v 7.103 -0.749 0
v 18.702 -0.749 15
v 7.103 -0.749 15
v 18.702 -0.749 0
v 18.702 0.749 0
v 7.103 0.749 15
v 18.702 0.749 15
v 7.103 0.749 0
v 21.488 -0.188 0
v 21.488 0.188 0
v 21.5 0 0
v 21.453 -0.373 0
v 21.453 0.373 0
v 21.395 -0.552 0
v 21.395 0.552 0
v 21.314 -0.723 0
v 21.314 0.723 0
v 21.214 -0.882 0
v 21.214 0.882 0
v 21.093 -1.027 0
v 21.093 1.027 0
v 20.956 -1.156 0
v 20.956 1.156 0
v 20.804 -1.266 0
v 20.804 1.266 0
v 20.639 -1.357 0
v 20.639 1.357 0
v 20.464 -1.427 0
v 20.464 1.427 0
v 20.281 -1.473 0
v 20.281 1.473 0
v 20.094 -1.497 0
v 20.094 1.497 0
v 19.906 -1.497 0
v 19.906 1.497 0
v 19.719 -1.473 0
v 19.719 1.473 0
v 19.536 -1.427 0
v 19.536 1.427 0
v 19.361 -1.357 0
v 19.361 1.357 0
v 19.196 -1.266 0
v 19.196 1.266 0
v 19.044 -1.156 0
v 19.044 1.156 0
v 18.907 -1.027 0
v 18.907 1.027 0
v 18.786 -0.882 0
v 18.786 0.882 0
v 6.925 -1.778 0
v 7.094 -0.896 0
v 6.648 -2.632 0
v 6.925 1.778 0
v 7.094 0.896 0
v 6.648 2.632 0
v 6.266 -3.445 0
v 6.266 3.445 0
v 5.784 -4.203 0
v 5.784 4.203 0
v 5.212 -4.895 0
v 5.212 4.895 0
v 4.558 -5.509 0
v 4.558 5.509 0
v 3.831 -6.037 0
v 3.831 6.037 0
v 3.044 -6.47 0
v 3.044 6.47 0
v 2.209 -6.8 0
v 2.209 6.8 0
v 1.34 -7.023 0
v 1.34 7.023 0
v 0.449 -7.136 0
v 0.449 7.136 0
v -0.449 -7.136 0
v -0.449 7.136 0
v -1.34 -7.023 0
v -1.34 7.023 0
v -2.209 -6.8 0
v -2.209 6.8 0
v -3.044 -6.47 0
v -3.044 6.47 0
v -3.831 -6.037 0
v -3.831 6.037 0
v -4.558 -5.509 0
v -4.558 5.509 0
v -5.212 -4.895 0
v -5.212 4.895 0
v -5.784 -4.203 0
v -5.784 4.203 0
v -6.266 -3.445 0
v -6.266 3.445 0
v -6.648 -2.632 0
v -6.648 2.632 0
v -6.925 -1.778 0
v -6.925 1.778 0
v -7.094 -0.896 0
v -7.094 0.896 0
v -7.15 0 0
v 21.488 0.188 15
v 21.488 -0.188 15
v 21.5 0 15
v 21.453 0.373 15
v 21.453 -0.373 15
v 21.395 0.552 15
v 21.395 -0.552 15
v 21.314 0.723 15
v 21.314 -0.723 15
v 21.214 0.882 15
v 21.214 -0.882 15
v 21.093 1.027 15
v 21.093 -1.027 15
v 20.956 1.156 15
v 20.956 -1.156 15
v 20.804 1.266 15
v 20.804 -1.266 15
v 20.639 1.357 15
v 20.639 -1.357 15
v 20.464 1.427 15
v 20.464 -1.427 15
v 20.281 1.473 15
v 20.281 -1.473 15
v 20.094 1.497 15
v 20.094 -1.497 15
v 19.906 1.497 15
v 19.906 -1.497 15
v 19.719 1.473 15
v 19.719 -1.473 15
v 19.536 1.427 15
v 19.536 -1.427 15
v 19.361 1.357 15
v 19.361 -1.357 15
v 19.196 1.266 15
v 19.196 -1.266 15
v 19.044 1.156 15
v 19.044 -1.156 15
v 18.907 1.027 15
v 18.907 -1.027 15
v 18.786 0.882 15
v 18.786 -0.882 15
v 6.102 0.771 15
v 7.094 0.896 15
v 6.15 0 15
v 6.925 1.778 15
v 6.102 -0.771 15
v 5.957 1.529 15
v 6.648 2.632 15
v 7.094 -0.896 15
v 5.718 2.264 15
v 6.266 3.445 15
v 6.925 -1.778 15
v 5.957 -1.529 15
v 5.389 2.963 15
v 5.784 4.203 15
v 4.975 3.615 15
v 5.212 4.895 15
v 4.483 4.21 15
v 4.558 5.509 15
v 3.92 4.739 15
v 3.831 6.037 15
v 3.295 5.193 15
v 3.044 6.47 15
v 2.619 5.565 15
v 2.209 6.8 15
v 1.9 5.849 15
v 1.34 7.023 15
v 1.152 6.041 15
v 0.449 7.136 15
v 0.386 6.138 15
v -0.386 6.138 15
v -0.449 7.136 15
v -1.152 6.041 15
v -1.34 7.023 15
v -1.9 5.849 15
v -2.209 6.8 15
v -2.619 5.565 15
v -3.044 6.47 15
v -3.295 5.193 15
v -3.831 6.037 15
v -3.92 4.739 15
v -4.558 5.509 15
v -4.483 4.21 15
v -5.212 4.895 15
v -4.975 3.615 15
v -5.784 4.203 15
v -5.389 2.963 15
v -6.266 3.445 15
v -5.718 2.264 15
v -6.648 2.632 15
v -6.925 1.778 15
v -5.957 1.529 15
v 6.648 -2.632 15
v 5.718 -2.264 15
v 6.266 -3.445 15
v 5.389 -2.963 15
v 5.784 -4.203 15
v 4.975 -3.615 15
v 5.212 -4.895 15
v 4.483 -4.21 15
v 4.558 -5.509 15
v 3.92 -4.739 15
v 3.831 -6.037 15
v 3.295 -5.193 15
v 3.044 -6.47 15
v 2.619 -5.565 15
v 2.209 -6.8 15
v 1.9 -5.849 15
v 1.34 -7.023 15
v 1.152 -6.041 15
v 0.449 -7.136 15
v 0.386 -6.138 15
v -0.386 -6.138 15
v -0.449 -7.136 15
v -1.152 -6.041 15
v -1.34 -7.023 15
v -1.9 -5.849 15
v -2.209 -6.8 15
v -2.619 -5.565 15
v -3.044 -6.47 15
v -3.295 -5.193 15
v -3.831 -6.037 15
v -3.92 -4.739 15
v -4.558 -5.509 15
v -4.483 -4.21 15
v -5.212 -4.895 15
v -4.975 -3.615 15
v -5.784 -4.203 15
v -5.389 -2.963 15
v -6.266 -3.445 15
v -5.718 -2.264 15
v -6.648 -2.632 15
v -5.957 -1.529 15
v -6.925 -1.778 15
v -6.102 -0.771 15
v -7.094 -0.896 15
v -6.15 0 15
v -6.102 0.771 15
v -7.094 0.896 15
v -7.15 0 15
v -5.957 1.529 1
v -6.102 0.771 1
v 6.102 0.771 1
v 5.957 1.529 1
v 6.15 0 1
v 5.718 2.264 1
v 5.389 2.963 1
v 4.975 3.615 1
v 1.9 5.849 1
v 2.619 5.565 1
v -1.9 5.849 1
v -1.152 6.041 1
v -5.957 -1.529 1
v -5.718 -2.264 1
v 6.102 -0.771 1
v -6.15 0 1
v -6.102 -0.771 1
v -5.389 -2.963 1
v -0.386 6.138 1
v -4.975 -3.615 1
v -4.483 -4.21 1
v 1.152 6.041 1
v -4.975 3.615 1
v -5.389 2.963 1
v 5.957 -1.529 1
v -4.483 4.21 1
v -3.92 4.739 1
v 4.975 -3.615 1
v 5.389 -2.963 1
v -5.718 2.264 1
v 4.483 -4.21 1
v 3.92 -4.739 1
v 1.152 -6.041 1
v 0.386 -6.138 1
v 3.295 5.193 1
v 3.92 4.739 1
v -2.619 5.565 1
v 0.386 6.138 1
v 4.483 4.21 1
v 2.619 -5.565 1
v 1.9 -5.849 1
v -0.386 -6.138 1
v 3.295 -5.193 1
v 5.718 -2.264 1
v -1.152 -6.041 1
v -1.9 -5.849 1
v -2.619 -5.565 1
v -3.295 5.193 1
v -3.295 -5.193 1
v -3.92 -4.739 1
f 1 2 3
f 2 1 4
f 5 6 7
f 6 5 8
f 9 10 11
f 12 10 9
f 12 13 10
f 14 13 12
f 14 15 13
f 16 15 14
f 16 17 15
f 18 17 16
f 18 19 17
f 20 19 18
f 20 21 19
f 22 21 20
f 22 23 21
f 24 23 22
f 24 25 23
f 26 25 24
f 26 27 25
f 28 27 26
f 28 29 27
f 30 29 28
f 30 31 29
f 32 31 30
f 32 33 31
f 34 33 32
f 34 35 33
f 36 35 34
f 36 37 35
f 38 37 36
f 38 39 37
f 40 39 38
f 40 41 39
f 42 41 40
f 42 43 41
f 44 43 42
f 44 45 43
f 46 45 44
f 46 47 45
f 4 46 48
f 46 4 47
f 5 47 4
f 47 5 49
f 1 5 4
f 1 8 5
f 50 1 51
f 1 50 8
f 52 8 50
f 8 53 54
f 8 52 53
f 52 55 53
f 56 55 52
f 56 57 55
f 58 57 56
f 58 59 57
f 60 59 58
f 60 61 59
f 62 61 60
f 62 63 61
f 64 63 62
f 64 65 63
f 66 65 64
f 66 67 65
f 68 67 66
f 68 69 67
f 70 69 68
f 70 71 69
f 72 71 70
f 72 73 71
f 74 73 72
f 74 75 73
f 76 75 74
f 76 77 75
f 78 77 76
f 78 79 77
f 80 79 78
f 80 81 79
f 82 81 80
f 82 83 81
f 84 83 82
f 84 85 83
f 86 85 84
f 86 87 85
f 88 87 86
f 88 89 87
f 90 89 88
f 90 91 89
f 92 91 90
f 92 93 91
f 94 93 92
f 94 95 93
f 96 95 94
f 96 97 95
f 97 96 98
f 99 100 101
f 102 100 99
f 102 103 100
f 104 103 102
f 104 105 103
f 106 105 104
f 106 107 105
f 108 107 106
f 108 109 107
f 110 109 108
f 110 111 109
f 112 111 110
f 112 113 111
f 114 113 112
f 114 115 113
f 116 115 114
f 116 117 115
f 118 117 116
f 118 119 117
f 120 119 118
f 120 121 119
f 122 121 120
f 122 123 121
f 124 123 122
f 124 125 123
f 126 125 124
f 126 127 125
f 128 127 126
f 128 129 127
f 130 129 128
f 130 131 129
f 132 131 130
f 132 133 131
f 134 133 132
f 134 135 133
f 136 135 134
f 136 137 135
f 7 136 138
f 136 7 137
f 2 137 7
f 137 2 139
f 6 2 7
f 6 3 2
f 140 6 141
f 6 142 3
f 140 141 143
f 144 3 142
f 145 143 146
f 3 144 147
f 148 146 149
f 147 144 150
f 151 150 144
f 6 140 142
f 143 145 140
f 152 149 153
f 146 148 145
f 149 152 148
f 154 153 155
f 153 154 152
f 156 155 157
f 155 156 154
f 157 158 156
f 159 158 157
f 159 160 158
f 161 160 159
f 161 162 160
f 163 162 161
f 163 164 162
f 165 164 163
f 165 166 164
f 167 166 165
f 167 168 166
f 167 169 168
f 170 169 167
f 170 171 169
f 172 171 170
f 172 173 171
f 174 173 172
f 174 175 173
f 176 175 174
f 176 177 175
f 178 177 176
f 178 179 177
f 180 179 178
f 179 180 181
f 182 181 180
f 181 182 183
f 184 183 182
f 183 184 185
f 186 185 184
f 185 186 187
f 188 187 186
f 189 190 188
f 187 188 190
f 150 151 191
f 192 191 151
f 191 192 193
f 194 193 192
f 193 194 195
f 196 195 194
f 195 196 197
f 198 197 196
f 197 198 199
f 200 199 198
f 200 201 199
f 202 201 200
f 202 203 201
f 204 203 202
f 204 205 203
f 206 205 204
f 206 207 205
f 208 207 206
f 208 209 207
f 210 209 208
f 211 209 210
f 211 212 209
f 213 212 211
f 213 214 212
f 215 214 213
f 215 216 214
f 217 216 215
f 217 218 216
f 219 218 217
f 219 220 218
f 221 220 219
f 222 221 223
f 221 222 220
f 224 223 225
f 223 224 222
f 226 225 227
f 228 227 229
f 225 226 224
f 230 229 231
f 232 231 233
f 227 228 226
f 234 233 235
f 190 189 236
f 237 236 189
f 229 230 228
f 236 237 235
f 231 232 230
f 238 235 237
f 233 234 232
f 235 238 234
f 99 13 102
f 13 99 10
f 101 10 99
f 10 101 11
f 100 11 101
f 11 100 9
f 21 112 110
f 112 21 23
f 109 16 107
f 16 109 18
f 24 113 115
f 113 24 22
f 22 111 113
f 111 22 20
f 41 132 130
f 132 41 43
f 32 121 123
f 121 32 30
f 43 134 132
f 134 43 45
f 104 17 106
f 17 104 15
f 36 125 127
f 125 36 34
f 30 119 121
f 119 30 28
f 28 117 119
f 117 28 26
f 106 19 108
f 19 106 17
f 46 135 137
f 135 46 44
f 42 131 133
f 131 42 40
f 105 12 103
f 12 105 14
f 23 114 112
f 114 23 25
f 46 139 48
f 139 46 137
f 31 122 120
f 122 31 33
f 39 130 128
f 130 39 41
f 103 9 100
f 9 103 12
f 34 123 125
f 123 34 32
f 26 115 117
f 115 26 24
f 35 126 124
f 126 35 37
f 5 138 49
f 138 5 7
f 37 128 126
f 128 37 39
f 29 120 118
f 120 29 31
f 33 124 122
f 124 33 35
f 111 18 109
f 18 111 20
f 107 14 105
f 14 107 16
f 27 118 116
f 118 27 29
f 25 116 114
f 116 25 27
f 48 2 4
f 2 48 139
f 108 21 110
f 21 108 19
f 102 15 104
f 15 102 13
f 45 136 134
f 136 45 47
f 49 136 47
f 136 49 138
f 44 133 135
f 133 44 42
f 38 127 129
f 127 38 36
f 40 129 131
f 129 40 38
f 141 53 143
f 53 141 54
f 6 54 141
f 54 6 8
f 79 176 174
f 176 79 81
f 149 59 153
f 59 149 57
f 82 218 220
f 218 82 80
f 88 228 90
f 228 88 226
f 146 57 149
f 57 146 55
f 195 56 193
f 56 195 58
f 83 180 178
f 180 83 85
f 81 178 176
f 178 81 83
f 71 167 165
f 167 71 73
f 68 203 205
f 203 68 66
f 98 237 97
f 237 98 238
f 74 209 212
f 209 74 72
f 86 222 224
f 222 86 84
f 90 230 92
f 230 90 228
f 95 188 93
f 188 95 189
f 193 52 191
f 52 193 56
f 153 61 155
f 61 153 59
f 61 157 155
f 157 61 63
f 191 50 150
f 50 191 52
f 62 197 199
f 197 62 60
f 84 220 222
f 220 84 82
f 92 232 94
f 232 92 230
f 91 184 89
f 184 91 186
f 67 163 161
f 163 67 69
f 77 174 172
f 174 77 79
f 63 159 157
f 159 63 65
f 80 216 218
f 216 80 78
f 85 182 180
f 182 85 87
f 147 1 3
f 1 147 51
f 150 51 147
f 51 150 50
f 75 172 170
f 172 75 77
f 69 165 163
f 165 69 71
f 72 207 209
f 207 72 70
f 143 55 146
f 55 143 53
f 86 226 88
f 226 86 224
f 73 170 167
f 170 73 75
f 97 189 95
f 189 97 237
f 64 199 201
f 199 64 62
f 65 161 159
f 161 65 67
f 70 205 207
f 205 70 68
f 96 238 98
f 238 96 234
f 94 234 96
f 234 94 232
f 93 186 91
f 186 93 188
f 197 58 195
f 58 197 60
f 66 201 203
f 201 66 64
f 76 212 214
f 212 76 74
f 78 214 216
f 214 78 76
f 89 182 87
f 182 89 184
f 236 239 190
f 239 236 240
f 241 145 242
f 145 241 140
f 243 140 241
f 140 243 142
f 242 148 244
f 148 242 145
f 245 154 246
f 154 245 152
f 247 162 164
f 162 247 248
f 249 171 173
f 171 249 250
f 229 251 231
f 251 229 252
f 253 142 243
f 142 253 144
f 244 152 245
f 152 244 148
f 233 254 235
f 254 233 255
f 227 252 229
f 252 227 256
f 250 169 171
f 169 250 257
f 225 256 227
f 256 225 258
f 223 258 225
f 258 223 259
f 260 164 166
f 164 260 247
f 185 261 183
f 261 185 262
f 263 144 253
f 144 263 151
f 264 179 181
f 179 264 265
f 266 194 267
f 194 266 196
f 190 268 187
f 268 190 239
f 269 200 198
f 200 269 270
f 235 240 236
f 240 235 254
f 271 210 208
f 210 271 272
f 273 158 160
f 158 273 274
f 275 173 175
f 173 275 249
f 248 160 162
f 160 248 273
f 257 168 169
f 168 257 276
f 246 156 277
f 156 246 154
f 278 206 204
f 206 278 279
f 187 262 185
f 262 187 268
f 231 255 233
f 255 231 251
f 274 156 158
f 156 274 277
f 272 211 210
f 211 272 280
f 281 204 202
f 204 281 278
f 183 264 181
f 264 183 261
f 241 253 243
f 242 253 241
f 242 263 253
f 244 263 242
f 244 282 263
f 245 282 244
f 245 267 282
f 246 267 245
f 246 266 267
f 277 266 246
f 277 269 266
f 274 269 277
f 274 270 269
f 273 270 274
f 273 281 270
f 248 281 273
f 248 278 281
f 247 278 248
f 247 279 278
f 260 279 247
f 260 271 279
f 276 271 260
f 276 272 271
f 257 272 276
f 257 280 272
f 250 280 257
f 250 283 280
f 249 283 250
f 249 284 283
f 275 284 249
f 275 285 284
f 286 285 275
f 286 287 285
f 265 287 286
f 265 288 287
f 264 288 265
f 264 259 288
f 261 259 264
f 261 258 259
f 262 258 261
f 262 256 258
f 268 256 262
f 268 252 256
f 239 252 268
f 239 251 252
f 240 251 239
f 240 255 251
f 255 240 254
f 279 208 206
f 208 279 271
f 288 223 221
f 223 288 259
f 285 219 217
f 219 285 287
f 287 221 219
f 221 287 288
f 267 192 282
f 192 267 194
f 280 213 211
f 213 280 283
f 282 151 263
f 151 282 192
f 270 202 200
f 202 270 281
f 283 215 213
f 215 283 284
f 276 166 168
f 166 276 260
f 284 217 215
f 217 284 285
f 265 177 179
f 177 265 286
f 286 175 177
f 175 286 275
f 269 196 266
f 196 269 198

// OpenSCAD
// Paramaterizable Window Security Dowel Tab by Michael Gebis
// ivymike at gmail and twitter. I'd love to hear from you!

// To the extent possible under law, the author(s) have dedicated all
// copyright and related and neighboring rights to this software to the
// public domain worldwide. This software is distributed without any
// warranty. Use at your own risk!

// I ask but do not require that you credit me if you use or remix this. Thank you!


// I suggest that you measure the dowel using calipers and test fit.  The nominal
// dimensions of the dowel may be slightly off, and you want a snug fit.
HOLE_DIA_MM         = 12.3;

// Reasonable defaults for everything else:
HEIGHT_MM           = 15;
TAB_THICKNESS_MM    = 1.5;
WALL_THICKNESS_MM   = 1;
LENGTH_MM           = 20;

$fn=50;

module create_tab() {
    hull() {
        cylinder(h=HEIGHT_MM, d=TAB_THICKNESS_MM);
        translate([LENGTH_MM,0,0]) {
            cylinder(h=HEIGHT_MM,d=TAB_THICKNESS_MM);
        }
    }
    translate([LENGTH_MM,0,0]) {
        cylinder(h=HEIGHT_MM, d=TAB_THICKNESS_MM*2);
    }
}

module create_all() {
    difference() {
        union() {
            create_tab();
            // Create the main body
            cylinder(h=HEIGHT_MM, d=HOLE_DIA_MM+WALL_THICKNESS_MM*2);
        }
        translate([0,0,WALL_THICKNESS_MM]) {
            // "Drill" out the dowel hole
            cylinder(h=HEIGHT_MM, d=HOLE_DIA_MM);
        }
    }
}

create_all();
